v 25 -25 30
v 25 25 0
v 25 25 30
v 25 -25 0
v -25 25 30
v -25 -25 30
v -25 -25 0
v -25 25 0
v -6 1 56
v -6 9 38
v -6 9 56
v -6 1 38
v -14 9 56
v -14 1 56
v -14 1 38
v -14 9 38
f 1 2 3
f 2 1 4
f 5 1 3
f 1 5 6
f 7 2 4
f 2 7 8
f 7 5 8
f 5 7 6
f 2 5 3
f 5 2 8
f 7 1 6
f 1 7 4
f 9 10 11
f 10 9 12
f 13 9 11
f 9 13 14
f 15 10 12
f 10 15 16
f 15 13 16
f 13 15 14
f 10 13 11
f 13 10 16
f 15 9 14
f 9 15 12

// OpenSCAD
// Simple 3D house with hipped roof
// Units: millimeters

// ---------- Parameters ----------
house_size      = 50;   // footprint size X and Y (<= 50mm)
wall_height     = 30;   // height of vertical walls
roof_height     = 20;   // extra height of roof above walls
wall_thickness  = 2;    // for door/window outlines if used

// Roof overhang relative to walls
roof_overhang   = 3;

// Chimney parameters
chimney_width   = 8;
chimney_depth   = 8;
chimney_height  = 18;
chimney_offsetX = -10;  // relative to center
chimney_offsetY = 5;

// Window/door sizes (for shallow embossed rectangles)
win_size        = [8, 8, 0.8];    // width, height, depth
door_size       = [12, 18, 0.8];

// ---------- Main assembly ----------
module house_body() {
    // Main cube of the house
    translate([-house_size/2, -house_size/2, 0])
        cube([house_size, house_size, wall_height], center = false);
}

module hipped_roof() {
    // Hipped roof represented as a pyramid frustum
    lower = house_size + 2*roof_overhang;
    upper = house_size * 0.25;  // small flat top at ridge

    translate([0, 0, wall_height])
        polyhedron(
            points = [
                // lower square (z = 0)
                [-lower/2, -lower/2, 0],
                [ lower/2, -lower/2, 0],
                [ lower/2,  lower/2, 0],
                [-lower/2,  lower/2, 0],

                // upper square (z = roof_height)
                [-upper/2, -upper/2, roof_height],
                [ upper/2, -upper/2, roof_height],
                [ upper/2,  upper/2, roof_height],
                [-upper/2,  upper/2, roof_height]
            ],
            faces = [
                // bottom ring (ignored, inside)
                [0,1,2,3],

                // sides
                [0,1,5,4],
                [1,2,6,5],
                [2,3,7,6],
                [3,0,4,7],

                // top
                [4,5,6,7]
            ]
        );
}

module chimney() {
    translate([chimney_offsetX - chimney_width/2,
               chimney_offsetY - chimney_depth/2,
               wall_height + roof_height*0.4])  // sink it into roof a bit
        cube([chimney_width, chimney_depth, chimney_height], center = false);
}

// Embossed window on front face
module window_at(x, z_center) {
    translate([x - win_size[0]/2,
               -house_size/2 - 0.01,           // slight offset in front
               z_center - win_size[1]/2])
        cube(win_size, center = false);
}

// Embossed door on front face
module door() {
    translate([-door_size[0]/2,
               -house_size/2 - 0.01,
               0])
        cube(door_size, center = false);
}

// ---------- Combine everything ----------
difference() {
    union() {
        house_body();
        hipped_roof();
        chimney();
    }

    // (Optional) cut out door and windows instead of embossing:
    // Uncomment below if you want real openings:
    /*
    window_at(-house_size/4, wall_height*0.6);
    window_at( house_size/4, wall_height*0.6);
    door();
    */
}

// If you prefer embossed instead of cut-outs, comment out the "difference()"
// block above and use this union instead:
//
// union() {
//     house_body();
//     hipped_roof();
//     chimney();
//
//     window_at(-house_size/4, wall_height*0.6);
//     window_at( house_size/4, wall_height*0.6);
//     door();
// }
